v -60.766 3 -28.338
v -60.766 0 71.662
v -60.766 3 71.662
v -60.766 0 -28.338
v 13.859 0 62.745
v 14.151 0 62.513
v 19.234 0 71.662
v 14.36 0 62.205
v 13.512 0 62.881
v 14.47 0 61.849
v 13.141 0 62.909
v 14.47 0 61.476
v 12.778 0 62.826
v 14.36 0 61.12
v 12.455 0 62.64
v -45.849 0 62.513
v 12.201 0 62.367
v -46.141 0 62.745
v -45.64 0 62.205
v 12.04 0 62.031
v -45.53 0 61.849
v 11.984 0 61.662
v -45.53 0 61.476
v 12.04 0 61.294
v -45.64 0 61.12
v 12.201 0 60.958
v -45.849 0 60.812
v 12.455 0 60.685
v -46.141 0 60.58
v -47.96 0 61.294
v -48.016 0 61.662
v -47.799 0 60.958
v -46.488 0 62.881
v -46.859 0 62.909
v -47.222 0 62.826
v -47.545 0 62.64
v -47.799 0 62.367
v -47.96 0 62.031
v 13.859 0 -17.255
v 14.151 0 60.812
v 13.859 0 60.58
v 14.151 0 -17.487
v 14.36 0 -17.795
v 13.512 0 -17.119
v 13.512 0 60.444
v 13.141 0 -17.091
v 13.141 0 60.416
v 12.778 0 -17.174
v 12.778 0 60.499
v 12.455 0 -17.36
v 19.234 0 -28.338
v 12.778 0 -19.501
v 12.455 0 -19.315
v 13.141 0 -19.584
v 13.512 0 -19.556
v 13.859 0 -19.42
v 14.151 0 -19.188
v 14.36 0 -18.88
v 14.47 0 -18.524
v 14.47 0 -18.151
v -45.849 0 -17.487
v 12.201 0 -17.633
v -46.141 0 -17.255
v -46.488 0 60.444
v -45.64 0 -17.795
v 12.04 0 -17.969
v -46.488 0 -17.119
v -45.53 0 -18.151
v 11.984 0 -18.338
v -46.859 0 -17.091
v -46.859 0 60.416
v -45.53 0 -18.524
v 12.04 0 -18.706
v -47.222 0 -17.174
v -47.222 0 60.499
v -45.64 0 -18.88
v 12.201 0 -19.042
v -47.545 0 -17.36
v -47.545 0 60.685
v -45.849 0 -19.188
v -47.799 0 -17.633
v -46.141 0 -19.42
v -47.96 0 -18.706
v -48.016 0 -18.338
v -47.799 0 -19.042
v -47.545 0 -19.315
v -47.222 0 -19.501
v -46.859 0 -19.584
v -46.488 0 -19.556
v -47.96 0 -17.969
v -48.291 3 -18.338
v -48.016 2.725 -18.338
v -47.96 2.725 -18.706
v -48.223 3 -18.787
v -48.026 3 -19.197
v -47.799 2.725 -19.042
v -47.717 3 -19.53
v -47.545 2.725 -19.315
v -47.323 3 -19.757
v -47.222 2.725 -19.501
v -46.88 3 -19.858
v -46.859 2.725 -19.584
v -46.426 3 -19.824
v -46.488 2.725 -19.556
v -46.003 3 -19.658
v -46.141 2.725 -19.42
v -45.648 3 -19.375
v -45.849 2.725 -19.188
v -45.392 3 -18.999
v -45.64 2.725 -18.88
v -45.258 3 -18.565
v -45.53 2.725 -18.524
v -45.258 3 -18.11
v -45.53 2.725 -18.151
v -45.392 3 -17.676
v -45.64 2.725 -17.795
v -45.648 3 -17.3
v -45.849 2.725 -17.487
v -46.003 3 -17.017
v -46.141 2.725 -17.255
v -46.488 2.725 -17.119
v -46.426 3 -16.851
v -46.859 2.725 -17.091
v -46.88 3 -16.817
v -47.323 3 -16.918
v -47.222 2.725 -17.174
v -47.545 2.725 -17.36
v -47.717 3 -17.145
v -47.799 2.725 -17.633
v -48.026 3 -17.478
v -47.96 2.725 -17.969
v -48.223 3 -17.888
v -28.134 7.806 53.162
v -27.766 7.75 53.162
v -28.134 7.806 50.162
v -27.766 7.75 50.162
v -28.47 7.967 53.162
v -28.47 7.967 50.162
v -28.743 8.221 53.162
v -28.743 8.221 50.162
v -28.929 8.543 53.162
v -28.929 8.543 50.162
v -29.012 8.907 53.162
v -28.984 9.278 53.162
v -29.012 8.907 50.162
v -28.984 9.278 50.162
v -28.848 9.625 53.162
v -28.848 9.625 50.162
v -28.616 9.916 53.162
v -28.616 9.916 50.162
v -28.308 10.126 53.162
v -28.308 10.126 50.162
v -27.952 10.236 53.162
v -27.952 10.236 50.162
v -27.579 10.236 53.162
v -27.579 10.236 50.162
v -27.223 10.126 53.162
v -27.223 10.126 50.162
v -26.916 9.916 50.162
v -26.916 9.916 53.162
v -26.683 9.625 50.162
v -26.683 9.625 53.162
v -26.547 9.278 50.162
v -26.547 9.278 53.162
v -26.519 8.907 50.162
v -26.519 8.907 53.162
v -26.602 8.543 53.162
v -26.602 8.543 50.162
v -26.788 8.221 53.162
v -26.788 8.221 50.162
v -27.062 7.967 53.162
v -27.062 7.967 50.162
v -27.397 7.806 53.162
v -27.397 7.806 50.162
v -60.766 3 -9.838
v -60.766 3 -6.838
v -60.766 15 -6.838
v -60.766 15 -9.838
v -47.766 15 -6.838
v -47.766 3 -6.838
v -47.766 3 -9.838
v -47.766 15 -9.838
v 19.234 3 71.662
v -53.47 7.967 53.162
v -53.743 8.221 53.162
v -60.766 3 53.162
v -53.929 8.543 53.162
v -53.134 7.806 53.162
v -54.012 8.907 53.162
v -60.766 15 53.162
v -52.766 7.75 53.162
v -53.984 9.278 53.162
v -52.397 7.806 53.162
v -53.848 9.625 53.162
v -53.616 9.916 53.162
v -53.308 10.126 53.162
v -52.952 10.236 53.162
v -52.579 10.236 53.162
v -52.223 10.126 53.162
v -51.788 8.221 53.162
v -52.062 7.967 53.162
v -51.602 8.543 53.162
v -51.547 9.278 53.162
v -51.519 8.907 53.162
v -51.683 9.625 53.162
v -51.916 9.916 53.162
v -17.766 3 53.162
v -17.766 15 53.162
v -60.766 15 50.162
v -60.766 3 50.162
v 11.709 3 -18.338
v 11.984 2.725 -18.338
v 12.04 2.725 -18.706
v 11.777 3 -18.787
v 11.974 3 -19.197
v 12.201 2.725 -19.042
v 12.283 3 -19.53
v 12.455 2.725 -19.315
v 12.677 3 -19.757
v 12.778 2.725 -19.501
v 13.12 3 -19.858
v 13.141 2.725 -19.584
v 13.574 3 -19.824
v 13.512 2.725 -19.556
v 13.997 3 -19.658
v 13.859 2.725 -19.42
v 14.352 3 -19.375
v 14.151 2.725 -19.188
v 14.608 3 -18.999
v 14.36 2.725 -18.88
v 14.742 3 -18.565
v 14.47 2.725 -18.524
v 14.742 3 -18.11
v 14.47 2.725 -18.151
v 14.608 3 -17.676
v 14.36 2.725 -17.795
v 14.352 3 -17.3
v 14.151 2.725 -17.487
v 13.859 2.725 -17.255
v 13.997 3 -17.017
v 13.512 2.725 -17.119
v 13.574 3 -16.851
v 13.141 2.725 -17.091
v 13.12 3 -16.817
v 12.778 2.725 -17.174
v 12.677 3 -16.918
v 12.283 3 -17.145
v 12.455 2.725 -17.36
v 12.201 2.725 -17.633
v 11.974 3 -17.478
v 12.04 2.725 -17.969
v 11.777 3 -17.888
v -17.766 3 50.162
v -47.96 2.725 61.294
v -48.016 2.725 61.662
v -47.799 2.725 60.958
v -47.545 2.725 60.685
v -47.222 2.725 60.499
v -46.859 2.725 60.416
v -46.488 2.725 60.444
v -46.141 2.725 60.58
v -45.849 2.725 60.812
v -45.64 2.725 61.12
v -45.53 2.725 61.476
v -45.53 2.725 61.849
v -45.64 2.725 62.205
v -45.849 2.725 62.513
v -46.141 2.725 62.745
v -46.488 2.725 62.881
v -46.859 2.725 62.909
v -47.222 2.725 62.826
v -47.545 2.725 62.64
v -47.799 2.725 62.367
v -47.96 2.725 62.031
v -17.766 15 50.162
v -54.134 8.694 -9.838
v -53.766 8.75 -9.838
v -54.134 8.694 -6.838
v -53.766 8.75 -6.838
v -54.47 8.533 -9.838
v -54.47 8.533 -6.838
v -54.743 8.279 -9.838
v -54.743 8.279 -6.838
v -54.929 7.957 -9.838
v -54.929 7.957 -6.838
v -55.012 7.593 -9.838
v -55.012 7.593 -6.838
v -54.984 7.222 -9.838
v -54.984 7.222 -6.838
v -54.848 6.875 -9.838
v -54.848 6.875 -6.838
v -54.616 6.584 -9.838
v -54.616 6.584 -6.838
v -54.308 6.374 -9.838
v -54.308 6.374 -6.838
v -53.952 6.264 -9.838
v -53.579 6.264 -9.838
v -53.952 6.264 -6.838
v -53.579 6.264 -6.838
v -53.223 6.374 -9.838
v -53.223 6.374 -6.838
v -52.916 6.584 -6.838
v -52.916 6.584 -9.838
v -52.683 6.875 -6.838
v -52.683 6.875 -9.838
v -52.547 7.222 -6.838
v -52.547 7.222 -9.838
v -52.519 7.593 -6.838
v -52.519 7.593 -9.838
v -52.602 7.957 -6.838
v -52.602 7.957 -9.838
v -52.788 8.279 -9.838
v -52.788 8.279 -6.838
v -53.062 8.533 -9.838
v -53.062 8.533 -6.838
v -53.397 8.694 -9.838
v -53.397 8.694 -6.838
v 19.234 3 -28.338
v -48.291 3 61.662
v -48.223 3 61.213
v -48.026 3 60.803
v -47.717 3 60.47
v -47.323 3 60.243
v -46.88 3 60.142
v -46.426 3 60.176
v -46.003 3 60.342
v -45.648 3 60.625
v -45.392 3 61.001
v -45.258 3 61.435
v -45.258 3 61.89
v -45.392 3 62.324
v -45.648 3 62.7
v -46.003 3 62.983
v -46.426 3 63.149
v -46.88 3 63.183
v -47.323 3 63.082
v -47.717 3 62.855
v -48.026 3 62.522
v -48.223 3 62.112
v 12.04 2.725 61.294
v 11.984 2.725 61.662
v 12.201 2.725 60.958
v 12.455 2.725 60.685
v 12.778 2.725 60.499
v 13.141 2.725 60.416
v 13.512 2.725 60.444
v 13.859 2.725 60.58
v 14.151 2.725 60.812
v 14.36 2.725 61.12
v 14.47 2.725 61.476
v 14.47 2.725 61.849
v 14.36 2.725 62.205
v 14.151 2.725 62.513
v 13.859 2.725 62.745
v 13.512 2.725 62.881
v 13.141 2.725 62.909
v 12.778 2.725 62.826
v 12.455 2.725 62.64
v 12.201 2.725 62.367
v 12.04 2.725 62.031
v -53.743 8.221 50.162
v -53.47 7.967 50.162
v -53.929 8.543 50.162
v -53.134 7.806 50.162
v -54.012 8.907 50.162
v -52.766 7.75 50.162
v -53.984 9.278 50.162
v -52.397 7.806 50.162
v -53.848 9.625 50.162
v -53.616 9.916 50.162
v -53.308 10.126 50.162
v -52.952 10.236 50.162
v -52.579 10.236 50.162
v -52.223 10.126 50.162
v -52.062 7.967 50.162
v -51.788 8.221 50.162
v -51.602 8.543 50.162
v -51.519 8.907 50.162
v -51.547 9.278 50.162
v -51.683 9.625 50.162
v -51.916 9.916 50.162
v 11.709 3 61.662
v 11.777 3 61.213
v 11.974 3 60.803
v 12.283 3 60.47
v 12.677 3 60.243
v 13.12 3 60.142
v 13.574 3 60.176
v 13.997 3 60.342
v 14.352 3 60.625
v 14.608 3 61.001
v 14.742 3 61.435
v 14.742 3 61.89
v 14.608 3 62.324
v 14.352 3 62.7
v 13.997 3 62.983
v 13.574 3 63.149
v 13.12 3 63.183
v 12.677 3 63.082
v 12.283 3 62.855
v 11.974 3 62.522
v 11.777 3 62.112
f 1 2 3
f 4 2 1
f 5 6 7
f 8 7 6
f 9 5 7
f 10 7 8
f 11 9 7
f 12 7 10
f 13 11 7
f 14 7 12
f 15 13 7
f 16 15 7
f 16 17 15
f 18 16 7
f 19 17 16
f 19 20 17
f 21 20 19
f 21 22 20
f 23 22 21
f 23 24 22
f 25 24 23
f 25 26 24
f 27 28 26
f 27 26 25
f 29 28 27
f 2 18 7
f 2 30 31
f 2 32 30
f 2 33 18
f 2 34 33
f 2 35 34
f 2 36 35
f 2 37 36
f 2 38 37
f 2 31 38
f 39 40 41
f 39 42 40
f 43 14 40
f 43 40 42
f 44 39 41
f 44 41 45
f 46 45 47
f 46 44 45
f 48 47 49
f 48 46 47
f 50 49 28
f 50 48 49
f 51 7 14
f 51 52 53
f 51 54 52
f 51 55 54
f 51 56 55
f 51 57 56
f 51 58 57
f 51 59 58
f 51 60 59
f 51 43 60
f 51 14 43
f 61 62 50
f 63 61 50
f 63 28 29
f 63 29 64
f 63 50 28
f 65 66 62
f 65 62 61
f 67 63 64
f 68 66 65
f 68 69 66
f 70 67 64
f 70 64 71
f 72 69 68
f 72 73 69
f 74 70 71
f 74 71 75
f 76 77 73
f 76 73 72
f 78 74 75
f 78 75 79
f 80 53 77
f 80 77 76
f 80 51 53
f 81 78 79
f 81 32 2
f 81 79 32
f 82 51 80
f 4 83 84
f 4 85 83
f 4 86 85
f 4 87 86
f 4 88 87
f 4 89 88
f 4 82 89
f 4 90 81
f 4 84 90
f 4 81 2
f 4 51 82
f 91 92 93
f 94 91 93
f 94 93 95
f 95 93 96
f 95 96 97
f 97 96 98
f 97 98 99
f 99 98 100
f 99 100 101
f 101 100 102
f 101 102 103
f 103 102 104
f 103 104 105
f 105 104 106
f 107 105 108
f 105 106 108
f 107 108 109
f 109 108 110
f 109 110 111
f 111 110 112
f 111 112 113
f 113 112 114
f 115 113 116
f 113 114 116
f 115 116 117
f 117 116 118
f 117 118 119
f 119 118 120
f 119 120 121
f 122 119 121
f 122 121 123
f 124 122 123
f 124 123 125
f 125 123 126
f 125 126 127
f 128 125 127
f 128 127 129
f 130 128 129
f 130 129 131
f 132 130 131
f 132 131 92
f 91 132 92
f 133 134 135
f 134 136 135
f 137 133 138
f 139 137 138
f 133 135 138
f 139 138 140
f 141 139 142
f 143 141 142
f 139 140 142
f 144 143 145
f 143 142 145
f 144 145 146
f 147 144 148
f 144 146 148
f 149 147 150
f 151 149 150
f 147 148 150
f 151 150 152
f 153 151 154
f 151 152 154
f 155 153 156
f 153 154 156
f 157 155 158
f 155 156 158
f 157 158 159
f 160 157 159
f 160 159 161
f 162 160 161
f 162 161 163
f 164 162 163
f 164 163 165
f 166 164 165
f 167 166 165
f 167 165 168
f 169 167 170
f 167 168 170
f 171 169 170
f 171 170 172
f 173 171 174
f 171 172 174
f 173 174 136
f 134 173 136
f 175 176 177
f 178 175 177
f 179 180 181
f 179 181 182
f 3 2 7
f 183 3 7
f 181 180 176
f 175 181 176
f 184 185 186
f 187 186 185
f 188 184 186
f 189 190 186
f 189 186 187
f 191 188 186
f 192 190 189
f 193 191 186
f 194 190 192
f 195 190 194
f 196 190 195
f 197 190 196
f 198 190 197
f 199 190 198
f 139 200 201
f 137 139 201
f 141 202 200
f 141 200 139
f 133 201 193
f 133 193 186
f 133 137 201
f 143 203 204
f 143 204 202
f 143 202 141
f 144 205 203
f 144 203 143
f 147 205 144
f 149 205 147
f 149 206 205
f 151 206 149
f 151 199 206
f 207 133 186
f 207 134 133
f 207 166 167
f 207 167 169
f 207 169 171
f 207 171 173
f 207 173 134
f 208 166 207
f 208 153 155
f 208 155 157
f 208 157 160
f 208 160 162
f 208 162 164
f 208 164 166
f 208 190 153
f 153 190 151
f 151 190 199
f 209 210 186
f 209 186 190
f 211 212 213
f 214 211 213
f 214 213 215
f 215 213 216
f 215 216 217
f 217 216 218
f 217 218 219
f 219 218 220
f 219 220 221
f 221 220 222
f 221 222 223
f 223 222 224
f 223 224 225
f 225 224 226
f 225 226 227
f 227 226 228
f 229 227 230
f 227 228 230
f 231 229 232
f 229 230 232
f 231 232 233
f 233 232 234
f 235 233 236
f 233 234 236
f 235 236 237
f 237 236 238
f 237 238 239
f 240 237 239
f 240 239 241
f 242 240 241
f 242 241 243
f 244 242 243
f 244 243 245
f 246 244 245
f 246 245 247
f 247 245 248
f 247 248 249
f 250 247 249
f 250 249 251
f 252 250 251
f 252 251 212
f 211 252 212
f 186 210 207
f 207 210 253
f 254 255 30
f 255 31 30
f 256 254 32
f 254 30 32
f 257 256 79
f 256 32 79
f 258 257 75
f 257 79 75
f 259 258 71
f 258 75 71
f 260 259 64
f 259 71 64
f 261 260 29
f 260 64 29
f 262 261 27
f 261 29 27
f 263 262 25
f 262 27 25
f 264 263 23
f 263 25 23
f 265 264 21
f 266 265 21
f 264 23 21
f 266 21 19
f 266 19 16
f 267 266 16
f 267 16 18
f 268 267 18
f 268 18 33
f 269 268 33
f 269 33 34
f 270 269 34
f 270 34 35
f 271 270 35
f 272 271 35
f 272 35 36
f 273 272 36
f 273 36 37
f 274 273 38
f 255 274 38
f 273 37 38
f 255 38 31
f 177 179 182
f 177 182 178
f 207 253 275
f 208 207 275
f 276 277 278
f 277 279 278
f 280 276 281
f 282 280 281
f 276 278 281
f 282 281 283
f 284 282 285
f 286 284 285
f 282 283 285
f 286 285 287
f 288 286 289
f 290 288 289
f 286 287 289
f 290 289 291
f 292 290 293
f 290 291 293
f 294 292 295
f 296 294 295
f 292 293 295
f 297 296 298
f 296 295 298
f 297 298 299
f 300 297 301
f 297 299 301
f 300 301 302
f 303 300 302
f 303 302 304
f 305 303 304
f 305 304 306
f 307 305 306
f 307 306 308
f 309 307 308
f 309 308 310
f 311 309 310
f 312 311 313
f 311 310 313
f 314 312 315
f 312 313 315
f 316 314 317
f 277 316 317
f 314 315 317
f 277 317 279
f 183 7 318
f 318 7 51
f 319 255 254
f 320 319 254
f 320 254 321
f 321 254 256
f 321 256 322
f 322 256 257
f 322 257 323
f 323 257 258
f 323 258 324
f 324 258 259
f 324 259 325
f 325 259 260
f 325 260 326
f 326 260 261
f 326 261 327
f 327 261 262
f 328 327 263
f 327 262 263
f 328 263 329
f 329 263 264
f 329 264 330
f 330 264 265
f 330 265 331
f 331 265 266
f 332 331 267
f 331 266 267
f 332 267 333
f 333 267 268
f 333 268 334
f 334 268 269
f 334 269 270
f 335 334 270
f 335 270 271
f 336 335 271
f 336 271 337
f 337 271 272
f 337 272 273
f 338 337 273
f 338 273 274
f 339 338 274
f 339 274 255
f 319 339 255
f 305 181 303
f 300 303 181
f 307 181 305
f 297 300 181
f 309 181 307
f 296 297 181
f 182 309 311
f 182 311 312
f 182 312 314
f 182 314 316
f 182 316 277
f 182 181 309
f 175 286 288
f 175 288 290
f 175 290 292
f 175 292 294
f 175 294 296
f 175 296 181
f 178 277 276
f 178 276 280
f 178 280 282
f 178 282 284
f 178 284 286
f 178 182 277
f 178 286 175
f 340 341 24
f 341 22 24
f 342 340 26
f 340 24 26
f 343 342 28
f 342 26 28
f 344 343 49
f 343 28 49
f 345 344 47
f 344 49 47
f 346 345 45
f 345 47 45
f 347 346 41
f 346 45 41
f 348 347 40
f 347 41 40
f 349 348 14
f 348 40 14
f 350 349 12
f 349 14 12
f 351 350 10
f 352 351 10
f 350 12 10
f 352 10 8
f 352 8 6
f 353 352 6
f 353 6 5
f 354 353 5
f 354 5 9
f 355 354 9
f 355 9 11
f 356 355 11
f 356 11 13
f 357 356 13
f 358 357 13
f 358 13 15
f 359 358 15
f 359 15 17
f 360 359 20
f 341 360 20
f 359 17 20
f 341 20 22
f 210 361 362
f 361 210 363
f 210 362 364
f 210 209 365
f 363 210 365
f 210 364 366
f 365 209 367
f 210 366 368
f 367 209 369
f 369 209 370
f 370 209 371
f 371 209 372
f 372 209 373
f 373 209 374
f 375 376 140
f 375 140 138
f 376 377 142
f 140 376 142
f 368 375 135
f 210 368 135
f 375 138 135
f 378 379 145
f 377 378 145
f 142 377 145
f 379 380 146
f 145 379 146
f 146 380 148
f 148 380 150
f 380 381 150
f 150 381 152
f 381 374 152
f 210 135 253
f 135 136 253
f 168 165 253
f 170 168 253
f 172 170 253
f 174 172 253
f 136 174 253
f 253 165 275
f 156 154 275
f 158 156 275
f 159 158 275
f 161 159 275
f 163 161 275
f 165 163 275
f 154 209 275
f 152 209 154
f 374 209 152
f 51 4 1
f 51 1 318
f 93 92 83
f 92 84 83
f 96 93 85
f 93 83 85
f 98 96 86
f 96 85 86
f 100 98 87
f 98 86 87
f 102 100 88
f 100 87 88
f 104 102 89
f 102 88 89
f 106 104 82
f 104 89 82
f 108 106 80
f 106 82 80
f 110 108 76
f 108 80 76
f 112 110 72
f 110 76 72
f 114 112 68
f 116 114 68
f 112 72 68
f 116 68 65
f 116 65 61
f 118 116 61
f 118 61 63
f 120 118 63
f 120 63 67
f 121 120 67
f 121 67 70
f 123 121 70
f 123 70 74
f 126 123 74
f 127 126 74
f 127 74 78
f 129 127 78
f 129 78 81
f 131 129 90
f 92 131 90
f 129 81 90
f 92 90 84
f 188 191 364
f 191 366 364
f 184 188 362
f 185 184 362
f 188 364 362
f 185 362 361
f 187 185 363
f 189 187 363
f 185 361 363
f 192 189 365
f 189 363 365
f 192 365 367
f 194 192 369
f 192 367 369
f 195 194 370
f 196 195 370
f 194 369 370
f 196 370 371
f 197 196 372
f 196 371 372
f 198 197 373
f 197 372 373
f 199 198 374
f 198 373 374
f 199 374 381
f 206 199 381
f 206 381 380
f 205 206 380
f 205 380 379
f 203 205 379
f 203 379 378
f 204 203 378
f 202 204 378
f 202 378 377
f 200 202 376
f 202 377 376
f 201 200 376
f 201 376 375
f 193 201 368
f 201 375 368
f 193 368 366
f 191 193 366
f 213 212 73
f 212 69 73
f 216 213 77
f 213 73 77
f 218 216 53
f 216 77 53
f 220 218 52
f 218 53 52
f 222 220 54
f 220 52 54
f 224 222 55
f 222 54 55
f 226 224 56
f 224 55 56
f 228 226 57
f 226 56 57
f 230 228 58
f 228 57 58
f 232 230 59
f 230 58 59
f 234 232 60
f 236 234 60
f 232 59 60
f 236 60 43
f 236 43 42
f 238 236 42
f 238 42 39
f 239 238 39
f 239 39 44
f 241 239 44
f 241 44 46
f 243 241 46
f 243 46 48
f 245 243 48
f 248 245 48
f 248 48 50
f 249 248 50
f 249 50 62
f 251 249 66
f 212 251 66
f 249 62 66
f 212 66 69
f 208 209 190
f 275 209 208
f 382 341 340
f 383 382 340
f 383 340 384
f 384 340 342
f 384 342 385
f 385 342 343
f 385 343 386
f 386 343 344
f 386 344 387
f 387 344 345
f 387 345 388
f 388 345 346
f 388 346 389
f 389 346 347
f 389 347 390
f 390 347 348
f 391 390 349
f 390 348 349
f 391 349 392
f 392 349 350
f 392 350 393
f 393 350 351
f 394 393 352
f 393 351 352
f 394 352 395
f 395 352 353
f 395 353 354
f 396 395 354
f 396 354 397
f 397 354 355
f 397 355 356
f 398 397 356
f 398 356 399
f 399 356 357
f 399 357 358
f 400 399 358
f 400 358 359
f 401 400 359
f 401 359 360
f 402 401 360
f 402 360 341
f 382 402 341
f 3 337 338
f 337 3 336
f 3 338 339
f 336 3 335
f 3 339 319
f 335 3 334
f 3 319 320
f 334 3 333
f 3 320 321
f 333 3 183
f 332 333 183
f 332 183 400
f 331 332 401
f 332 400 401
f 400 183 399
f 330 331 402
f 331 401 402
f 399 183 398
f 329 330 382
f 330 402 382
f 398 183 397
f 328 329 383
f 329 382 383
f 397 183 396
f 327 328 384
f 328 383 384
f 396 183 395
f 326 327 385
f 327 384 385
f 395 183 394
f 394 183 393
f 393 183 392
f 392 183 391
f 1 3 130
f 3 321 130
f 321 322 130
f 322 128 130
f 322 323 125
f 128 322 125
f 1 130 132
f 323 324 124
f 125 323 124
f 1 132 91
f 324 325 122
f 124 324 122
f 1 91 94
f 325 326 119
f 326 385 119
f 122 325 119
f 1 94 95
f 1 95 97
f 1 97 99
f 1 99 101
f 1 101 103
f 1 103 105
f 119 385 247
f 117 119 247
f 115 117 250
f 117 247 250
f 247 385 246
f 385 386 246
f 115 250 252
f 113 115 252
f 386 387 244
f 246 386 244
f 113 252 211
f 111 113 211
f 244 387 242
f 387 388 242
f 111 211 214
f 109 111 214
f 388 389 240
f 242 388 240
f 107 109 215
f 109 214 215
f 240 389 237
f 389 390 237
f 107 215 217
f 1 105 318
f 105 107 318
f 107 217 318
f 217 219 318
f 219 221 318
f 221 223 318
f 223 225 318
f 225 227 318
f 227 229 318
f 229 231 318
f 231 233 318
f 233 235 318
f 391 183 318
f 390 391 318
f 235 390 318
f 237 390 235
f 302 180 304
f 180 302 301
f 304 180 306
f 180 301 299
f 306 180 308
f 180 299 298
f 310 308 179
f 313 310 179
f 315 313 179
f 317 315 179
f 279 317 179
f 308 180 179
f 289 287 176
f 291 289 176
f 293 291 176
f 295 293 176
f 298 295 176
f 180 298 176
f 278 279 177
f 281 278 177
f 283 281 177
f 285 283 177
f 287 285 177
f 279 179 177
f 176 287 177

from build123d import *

# Parameters (mm, degrees)
SKETCH_1_W                   = 80
SKETCH_1_H                   = 100
EXTRUDE_1_DEPTH              = 3
SKETCH_2_W                   = 97
SKETCH_2_H                   = 57
SKETCH_2_W_2                 = 91
SKETCH_2_H_2                 = 51
EXTRUDE_2_DEPTH              = 45
SKETCH_3_W                   = 3
SKETCH_3_H                   = 34
EXTRUDE_3_DEPTH              = 51
SKETCH_4_W                   = 30
SKETCH_4_H                   = 6
CUT_EXTRUDE_2_DEPTH          = 50
SKETCH_5_W                   = 57
SKETCH_5_H                   = 57
SKETCH_5_W_2                 = 51
SKETCH_5_H_2                 = 51
EXTRUDE_4_DEPTH              = 30
HOLE_WIZARD_M3_1_D           = 2.5
HOLE_WIZARD_M3_1_CSINK_D     = 3.05
HOLE_WIZARD_M3_1_CSINK_ANGLE = 90
SKETCH_9_W                   = 3
SKETCH_9_H                   = 57
CUT_EXTRUDE_3_DEPTH          = 27
SKETCH_10_W                  = 50
SKETCH_10_H                  = 8
CUT_EXTRUDE_4_DEPTH          = 30
HOLE_WIZARD_M3_3_D           = 2.5
HOLE_WIZARD_M3_3_DEPTH       = 3
HOLE_WIZARD_M3_4_D           = 2.5
HOLE_WIZARD_M3_4_DEPTH       = 3
SKETCH_23_W                  = 43
SKETCH_23_H                  = 12
EXTRUDE_8_DEPTH              = 3
SKETCH_28_W                  = 13
SKETCH_28_H                  = 12
EXTRUDE_9_DEPTH              = 3
SKETCH_31_W                  = 57
SKETCH_31_H                  = 45
CUT_EXTRUDE_5_DEPTH          = 130.801793915
SKETCH_32_W                  = 54
SKETCH_32_H                  = 57
CUT_EXTRUDE_6_DEPTH          = 139.588165155
SKETCH_37_W                  = 1.25
SKETCH_37_H                  = 3
HOLE_WIZARD_M3_5_AT_2_COUNT  = 2
HOLE_WIZARD_M3_5_AT_2_PITCH  = 25
SKETCH_39_W                  = 1.25
SKETCH_39_H                  = 3


with BuildPart() as part:
    # 草图1 → 凸台-拉伸1 (new body)
    with BuildSketch(Plane(origin=(0, 0, 0), x_dir=(1, 0, 0), z_dir=(0, 1, 0))):
        with Locations((-20.765734509, -21.662442769)):
            Rectangle(SKETCH_1_W, SKETCH_1_H)
    extrude(amount=EXTRUDE_1_DEPTH)

    # 草图2 → 凸台-拉伸2 (add)
    with BuildSketch(Plane(origin=(0, 3, 0), x_dir=(1, 0, 0), z_dir=(0, 1, 0))):
        with Locations((-66.265734509, -21.662442769)):
            Rectangle(SKETCH_2_W, SKETCH_2_H)
        with Locations((-66.265734509, -21.662442769)):
            Rectangle(SKETCH_2_W_2, SKETCH_2_H_2, mode=Mode.SUBTRACT)
    extrude(amount=EXTRUDE_2_DEPTH)

    # 草图3 → 凸台-拉伸3 (add)
    with BuildSketch(Plane.XY.offset(-3.837557231)):
        with Locations((-73.265734509, 31)):
            Rectangle(SKETCH_3_W, SKETCH_3_H)
    extrude(amount=EXTRUDE_3_DEPTH)

    # 草图4 → 切除-拉伸2 (cut)
    with BuildSketch(Plane(origin=(0, 0, -6.837557231), x_dir=(-1, 0, 0), z_dir=(0, 0, -1))):
        with Locations((32.765734509, 6)):
            Rectangle(SKETCH_4_W, SKETCH_4_H)
    extrude(amount=-CUT_EXTRUDE_2_DEPTH, mode=Mode.SUBTRACT)

    # 草图5 → 凸台-拉伸4 (add)
    with BuildSketch(Plane.XZ.offset(-3)):
        with Locations((-86.265734509, 21.662442769)):
            Rectangle(SKETCH_5_W, SKETCH_5_H)
        with Locations((-86.265734509, 21.662442769)):
            Rectangle(SKETCH_5_W_2, SKETCH_5_H_2, mode=Mode.SUBTRACT)
    extrude(amount=EXTRUDE_4_DEPTH)

    # M3 螺纹孔1 (through all)
    with Locations(Plane(origin=(0, 3, 0), x_dir=(1, 0, 0), z_dir=(0, 1, 0))):
        with Locations((-46.765734509, 18.337557231), (13.234265491, 18.337557231), (13.234265491, -61.662442769), (-46.765734509, -61.662442769)):
            CounterSinkHole(HOLE_WIZARD_M3_1_D / 2, HOLE_WIZARD_M3_1_CSINK_D / 2, counter_sink_angle=HOLE_WIZARD_M3_1_CSINK_ANGLE)

    # 草图9 → 切除-拉伸3 (cut)
    with BuildSketch(Plane(origin=(0, -27, 0), x_dir=(-1, 0, 0), z_dir=(0, -1, 0))):
        with Locations((59.265734509, -21.662442769)):
            Rectangle(SKETCH_9_W, SKETCH_9_H)
    extrude(amount=-CUT_EXTRUDE_3_DEPTH, mode=Mode.SUBTRACT)

    # 草图10 → 切除-拉伸4 (cut)
    with BuildSketch(Plane(origin=(-17.765734509, 0, 0), x_dir=(0, 0, -1), z_dir=(1, 0, 0))):
        with Locations((-18.162442769, 7)):
            Rectangle(SKETCH_10_W, SKETCH_10_H)
    extrude(amount=-CUT_EXTRUDE_4_DEPTH, mode=Mode.SUBTRACT)

    # M3 螺纹孔3
    with Locations(Plane(origin=(0, 0, -6.837557231), x_dir=(-1, 0, 0), z_dir=(0, 0, -1))):
        with Locations((53.765734509, 7.5)):
            Hole(HOLE_WIZARD_M3_3_D / 2, depth=HOLE_WIZARD_M3_3_DEPTH)

    # M3 螺纹孔4
    with Locations(Plane.XY.offset(50.162442769)):
        with Locations((-52.765734509, 9), (-27.765734509, 9)):
            Hole(HOLE_WIZARD_M3_4_D / 2, depth=HOLE_WIZARD_M3_4_DEPTH)

    # 草图31 → 切除-拉伸5 (cut, through all)
    with BuildSketch(Plane(origin=(-17.765734509, 0, 0), x_dir=(0, 0, -1), z_dir=(1, 0, 0))):
        with Locations((-21.662442769, 25.5)):
            Rectangle(SKETCH_31_W, SKETCH_31_H)
    extrude(amount=-CUT_EXTRUDE_5_DEPTH, mode=Mode.SUBTRACT)

    # 草图32 → 切除-拉伸6 (cut, through all)
    with BuildSketch(Plane(origin=(0, 3, 0), x_dir=(1, 0, 0), z_dir=(0, 1, 0))):
        with Locations((-87.765734509, -21.662442769)):
            Rectangle(SKETCH_32_W, SKETCH_32_H)
    extrude(amount=-CUT_EXTRUDE_6_DEPTH, mode=Mode.SUBTRACT)


with BuildPart() as body_2:
    # 草图23 → 凸台-拉伸8 (new body)
    with BuildSketch(Plane.XY.offset(50.162442769)):
        with Locations((-39.265734509, 9)):
            Rectangle(SKETCH_23_W, SKETCH_23_H)
    extrude(amount=EXTRUDE_8_DEPTH)

    # 草图37 → M3 螺纹孔5 (revolve, cut)
    with BuildSketch(Plane(origin=(-52.765734509, 9, 53.162442769), x_dir=(0, -1, 0), z_dir=(1, 0, 0))):
        with Locations((0.625, 1.5)):
            Rectangle(SKETCH_37_W, SKETCH_37_H)
    hole_wizard_m3_5 = revolve(axis=Axis((-52.765734509, 9, 59.512442769), (0, 0, -1)), mode=Mode.SUBTRACT)

    # M3 螺纹孔5 at 2: M3 螺纹孔5 ×2
    with Locations(*[(i * HOLE_WIZARD_M3_5_AT_2_PITCH, 0, 0) for i in range(1, HOLE_WIZARD_M3_5_AT_2_COUNT)]):
        add(hole_wizard_m3_5, mode=Mode.SUBTRACT)


with BuildPart() as body_3:
    # 草图28 → 凸台-拉伸9 (new body)
    with BuildSketch(Plane(origin=(0, 0, -6.837557231), x_dir=(-1, 0, 0), z_dir=(0, 0, -1))):
        with Locations((54.265734509, 9)):
            Rectangle(SKETCH_28_W, SKETCH_28_H)
    extrude(amount=EXTRUDE_9_DEPTH)

    # 草图39 → M3 螺纹孔6 (revolve, cut)
    with BuildSketch(Plane(origin=(-53.765734509, 7.5, -9.837557231), x_dir=(0, 1, 0), z_dir=(1, 0, 0))):
        with Locations((0.625, 1.5)):
            Rectangle(SKETCH_39_W, SKETCH_39_H)
    revolve(axis=Axis((-53.765734509, 7.5, -16.187557231), (0, 0, 1)), mode=Mode.SUBTRACT)


solid = Compound([part.part, body_2.part, body_3.part])
